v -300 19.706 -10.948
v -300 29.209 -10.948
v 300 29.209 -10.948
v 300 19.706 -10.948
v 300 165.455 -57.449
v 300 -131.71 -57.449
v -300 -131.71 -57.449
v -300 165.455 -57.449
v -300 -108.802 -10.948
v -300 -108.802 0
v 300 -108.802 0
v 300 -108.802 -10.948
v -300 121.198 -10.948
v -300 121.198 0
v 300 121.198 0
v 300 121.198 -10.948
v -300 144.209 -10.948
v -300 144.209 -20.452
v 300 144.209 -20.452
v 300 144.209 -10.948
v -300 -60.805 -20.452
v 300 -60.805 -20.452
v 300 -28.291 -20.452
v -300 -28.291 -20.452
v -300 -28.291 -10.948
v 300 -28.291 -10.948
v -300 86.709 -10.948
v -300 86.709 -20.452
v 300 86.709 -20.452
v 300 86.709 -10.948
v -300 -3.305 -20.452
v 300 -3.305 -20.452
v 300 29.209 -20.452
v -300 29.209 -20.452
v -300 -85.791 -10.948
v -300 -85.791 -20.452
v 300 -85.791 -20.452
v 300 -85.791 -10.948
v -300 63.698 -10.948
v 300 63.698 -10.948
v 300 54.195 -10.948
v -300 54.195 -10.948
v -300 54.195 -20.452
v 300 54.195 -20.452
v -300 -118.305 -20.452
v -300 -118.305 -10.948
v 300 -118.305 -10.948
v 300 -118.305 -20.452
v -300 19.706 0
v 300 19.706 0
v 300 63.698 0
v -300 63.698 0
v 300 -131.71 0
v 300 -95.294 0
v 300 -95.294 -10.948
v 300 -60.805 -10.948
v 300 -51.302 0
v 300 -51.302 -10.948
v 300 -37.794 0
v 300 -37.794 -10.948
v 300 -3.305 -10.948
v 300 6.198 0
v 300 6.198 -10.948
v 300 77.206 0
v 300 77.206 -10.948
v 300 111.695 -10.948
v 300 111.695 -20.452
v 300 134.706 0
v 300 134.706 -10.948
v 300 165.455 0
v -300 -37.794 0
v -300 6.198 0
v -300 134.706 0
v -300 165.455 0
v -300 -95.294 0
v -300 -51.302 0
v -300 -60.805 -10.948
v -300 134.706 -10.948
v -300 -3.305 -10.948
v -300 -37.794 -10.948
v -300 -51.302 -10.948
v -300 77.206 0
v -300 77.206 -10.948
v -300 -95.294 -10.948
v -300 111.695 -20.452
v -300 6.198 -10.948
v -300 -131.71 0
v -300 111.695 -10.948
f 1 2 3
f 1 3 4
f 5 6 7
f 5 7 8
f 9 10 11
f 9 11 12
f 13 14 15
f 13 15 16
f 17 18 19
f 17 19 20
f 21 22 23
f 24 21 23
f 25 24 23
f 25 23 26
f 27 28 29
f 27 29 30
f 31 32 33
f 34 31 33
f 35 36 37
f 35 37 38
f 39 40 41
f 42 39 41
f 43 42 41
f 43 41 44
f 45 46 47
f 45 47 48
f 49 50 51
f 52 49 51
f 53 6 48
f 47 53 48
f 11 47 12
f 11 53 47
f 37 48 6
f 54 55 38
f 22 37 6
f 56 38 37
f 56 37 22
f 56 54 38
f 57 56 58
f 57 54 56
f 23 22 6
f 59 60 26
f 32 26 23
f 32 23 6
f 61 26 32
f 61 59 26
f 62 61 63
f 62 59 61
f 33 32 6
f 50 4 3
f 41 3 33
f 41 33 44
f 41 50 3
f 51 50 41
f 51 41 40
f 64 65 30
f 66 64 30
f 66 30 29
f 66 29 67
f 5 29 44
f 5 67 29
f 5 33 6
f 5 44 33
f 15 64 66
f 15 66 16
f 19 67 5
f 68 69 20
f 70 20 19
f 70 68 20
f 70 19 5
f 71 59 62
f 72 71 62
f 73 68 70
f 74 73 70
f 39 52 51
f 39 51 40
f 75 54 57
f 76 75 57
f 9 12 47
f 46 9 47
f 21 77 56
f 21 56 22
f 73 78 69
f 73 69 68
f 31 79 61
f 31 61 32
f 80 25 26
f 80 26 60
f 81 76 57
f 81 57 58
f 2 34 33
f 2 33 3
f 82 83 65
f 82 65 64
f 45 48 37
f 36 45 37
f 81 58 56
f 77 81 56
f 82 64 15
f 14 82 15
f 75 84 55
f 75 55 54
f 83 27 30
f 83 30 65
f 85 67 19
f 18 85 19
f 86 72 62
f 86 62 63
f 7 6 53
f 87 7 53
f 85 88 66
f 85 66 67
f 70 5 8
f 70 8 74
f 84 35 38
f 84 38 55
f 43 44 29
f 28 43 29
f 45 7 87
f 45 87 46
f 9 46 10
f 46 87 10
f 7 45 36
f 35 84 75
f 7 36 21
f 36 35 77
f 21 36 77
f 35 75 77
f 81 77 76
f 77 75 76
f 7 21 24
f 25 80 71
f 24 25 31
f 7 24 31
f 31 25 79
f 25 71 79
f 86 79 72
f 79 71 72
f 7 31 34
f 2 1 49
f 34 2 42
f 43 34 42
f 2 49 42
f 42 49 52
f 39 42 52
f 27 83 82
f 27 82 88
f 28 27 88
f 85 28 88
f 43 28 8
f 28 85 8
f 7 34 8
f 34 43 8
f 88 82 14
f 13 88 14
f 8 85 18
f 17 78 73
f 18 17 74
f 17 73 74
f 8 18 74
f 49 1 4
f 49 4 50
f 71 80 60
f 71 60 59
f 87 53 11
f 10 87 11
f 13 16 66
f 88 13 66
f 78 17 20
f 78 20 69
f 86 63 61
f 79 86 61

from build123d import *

# Parameters (mm, degrees)
SKETCH002_W         = 297.164322
SKETCH002_H         = 57.449348
PAD001_DEPTH        = 300
POCKET001_DEPTH     = 600
LINEARPATTERN_COUNT = 5
LINEARPATTERN_PITCH = 57.5


with BuildPart() as part:
    # Sketch002 → Pad001 (new body, symmetric)
    with BuildSketch(Plane.YZ):
        with Locations((16.872627, -28.724674)):
            Rectangle(SKETCH002_W, SKETCH002_H)
    extrude(amount=PAD001_DEPTH, both=True)

    # Sketch003 (on Face6 of Pad001) → Pocket001 (cut)
    with BuildSketch(Plane.YZ.offset(300)):
        Polygon((-108.802104, 0), (-108.802104, -10.94843), (-118.305492, -10.94843), (-118.305492, -20.451817), (-85.790531, -20.451817), (-85.790531, -10.94843), (-95.293918, -10.94843), (-95.293918, 0), align=None)
    pocket001 = extrude(amount=-POCKET001_DEPTH, mode=Mode.SUBTRACT)

    # LinearPattern: Pocket001 ×5
    with Locations(*[(0, i * LINEARPATTERN_PITCH, 0) for i in range(1, LINEARPATTERN_COUNT)]):
        add(pocket001, mode=Mode.SUBTRACT)


solid = part.part
